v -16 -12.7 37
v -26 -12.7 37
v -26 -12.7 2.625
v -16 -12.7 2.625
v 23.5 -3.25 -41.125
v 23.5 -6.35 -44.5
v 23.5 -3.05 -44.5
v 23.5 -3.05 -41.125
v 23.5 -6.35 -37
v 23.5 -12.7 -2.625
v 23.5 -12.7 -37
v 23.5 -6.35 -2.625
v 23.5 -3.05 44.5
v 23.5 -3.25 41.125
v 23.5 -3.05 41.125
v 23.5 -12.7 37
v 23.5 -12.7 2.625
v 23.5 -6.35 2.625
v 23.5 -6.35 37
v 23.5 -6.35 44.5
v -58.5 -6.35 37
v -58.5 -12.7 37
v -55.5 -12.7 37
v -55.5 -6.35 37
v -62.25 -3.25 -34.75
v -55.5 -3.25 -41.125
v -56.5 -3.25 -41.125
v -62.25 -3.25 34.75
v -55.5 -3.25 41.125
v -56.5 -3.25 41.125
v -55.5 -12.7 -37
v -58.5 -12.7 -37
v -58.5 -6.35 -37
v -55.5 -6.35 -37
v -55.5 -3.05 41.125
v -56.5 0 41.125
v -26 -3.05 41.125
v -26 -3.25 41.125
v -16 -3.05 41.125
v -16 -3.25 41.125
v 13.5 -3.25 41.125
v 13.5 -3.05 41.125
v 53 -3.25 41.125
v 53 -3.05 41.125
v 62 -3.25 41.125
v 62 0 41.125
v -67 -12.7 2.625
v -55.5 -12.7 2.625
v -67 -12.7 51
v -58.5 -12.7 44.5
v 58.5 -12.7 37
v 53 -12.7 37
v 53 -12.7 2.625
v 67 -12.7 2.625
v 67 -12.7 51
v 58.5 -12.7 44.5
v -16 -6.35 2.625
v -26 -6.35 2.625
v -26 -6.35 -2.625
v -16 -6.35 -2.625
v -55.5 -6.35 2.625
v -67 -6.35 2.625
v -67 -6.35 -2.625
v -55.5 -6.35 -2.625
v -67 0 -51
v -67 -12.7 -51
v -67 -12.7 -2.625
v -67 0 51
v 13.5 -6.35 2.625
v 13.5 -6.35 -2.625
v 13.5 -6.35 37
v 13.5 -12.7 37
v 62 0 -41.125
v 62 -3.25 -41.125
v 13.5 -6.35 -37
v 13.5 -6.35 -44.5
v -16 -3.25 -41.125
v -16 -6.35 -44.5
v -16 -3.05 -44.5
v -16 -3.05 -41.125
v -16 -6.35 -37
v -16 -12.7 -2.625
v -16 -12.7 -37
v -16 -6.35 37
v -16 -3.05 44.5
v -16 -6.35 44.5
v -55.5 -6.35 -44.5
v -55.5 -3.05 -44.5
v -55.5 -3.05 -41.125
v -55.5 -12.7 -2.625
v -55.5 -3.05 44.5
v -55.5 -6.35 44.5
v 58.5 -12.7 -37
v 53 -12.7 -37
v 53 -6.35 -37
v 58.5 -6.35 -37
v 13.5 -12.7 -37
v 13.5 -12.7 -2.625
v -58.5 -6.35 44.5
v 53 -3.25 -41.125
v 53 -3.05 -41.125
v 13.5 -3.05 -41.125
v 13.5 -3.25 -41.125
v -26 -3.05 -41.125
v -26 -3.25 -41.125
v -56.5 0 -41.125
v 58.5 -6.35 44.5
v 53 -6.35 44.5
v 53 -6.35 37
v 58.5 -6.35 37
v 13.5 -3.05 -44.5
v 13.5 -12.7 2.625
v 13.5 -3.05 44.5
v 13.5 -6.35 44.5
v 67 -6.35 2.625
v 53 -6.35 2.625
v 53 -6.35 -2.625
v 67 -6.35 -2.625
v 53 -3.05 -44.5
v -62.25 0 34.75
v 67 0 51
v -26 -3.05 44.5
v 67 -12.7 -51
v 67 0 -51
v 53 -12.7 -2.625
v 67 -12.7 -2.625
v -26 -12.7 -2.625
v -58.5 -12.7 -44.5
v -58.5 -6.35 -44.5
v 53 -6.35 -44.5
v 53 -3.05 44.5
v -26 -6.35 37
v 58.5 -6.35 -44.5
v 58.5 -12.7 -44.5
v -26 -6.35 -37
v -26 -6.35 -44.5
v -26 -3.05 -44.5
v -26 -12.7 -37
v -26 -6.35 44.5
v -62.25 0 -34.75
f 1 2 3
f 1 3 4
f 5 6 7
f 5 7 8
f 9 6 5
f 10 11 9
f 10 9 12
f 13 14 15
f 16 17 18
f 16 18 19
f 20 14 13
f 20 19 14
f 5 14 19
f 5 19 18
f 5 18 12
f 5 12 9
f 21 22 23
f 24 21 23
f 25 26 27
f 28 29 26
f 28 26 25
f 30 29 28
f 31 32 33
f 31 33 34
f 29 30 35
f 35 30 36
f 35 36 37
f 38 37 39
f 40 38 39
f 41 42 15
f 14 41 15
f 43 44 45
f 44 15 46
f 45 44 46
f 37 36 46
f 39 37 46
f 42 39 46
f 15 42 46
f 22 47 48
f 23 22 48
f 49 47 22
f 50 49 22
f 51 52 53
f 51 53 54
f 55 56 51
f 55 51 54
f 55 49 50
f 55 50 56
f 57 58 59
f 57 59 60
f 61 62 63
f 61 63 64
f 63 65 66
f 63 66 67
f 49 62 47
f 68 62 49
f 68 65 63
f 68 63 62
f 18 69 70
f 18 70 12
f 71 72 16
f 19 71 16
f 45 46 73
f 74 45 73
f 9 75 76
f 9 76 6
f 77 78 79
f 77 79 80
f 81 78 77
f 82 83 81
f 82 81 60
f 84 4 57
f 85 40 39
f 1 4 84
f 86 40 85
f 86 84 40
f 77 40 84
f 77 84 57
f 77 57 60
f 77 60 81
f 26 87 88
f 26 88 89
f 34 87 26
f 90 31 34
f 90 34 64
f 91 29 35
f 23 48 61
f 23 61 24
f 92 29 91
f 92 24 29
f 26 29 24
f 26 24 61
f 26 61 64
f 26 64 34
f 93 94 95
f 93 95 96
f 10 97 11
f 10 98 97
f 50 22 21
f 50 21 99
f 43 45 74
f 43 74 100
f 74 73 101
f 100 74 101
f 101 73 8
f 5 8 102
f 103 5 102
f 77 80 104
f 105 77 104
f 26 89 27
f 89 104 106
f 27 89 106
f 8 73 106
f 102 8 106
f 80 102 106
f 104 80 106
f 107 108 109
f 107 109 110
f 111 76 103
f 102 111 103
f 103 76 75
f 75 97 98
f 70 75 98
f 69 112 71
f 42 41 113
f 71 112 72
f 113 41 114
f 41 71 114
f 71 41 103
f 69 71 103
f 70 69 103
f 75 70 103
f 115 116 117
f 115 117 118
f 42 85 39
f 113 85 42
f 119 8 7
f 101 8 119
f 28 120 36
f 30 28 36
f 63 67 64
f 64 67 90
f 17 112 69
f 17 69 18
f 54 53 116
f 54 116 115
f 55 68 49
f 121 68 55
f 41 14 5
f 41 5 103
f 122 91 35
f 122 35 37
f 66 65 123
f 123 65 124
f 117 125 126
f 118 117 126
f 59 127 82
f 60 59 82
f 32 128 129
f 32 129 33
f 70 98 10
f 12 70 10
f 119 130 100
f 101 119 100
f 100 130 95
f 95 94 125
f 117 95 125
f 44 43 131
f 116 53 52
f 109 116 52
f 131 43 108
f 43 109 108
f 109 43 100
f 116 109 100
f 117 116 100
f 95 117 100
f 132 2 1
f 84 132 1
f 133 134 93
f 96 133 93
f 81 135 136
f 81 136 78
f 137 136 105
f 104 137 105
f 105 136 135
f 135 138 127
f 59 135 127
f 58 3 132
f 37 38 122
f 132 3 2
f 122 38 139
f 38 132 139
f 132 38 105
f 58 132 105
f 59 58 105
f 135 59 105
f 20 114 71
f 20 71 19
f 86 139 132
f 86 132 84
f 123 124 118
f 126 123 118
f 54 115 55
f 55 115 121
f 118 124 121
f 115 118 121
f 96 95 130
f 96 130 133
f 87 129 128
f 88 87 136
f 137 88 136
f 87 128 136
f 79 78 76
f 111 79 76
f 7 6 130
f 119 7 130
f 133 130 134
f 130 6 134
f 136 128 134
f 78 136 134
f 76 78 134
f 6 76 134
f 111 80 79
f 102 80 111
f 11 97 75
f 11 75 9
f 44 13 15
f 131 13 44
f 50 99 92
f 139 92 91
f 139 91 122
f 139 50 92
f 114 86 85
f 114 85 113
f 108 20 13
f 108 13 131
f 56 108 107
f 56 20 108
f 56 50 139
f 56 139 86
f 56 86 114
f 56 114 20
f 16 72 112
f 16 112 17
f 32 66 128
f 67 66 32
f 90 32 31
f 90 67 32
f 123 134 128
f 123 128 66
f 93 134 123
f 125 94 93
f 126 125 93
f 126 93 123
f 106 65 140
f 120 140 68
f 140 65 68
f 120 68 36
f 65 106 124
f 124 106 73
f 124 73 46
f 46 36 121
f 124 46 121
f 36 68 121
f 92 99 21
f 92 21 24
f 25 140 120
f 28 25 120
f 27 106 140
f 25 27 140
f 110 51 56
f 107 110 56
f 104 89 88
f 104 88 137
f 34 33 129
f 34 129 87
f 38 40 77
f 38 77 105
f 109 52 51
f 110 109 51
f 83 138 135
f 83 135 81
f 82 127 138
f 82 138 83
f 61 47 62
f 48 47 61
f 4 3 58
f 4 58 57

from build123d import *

# Parameters (mm, degrees)
F0_W      = 134
F0_H      = 102
F1_DEPTH  = 12.7
F2_W      = 29.5
F2_H      = 79.6
F3_DEPTH  = 12.7
F4_W      = 117
F4_H      = 7.5
F4_W_2    = 134
F4_H_2    = 5.25
F5_DEPTH  = 6.35
F8_DEPTH  = 3.25
F9_W      = 29.5
F9_H      = 4.7
F10_DEPTH = 3.3


with BuildPart() as f1:
    # F0 (on Front) → F1 (new body)
    with BuildSketch(Plane.XZ):
        Rectangle(F0_W, F0_H)
    extrude(amount=F1_DEPTH)

    # F2 (on face) → F3 (cut)
    with BuildSketch(Plane.XZ.offset(12.7)):
        with Locations((-1.25, 0)):
            Rectangle(F2_W, F2_H)
        Polygon((53, 39.8), (23.5, 39.8), (23.5, -39.8), (53, -39.8), (53, -16.022205), align=None)
        with Locations((-40.75, 0)):
            Rectangle(F2_W, F2_H)
    extrude(amount=-F3_DEPTH, mode=Mode.SUBTRACT)

    # F4 (on face) → F5 (cut)
    with BuildSketch(Plane.XZ.offset(12.7)):
        with Locations((0, 40.75)):
            Rectangle(F4_W, F4_H)
        Rectangle(F4_W_2, F4_H_2)
        with Locations((0, -40.75)):
            Rectangle(F4_W, F4_H)
    extrude(amount=-F5_DEPTH, mode=Mode.SUBTRACT)

    # F7 (on face) → F8 (cut)
    with BuildSketch(Plane(origin=(0, 0, 0), x_dir=(-1, 0, 0), z_dir=(0, 1, 0))):
        Polygon((56.5, 41.125), (-62, 41.125), (-62, -41.125), (56.5, -41.125), (62.25, -34.75), (62.25, 34.75), align=None)
    extrude(amount=-F8_DEPTH, mode=Mode.SUBTRACT)

    # F9 (on face) → F10 (cut)
    with BuildSketch(Plane.XZ.offset(6.35)):
        with Locations((-1.25, 42.15)):
            Rectangle(F9_W, F9_H)
        with Locations((38.25, 42.15)):
            Rectangle(F9_W, F9_H)
        with Locations((-40.75, 42.15)):
            Rectangle(F9_W, F9_H)
        with Locations((-40.75, -42.15)):
            Rectangle(F9_W, F9_H)
        with Locations((-1.25, -42.15)):
            Rectangle(F9_W, F9_H)
        with Locations((38.25, -42.15)):
            Rectangle(F9_W, F9_H)
    extrude(amount=-F10_DEPTH, mode=Mode.SUBTRACT)


solid = f1.part
